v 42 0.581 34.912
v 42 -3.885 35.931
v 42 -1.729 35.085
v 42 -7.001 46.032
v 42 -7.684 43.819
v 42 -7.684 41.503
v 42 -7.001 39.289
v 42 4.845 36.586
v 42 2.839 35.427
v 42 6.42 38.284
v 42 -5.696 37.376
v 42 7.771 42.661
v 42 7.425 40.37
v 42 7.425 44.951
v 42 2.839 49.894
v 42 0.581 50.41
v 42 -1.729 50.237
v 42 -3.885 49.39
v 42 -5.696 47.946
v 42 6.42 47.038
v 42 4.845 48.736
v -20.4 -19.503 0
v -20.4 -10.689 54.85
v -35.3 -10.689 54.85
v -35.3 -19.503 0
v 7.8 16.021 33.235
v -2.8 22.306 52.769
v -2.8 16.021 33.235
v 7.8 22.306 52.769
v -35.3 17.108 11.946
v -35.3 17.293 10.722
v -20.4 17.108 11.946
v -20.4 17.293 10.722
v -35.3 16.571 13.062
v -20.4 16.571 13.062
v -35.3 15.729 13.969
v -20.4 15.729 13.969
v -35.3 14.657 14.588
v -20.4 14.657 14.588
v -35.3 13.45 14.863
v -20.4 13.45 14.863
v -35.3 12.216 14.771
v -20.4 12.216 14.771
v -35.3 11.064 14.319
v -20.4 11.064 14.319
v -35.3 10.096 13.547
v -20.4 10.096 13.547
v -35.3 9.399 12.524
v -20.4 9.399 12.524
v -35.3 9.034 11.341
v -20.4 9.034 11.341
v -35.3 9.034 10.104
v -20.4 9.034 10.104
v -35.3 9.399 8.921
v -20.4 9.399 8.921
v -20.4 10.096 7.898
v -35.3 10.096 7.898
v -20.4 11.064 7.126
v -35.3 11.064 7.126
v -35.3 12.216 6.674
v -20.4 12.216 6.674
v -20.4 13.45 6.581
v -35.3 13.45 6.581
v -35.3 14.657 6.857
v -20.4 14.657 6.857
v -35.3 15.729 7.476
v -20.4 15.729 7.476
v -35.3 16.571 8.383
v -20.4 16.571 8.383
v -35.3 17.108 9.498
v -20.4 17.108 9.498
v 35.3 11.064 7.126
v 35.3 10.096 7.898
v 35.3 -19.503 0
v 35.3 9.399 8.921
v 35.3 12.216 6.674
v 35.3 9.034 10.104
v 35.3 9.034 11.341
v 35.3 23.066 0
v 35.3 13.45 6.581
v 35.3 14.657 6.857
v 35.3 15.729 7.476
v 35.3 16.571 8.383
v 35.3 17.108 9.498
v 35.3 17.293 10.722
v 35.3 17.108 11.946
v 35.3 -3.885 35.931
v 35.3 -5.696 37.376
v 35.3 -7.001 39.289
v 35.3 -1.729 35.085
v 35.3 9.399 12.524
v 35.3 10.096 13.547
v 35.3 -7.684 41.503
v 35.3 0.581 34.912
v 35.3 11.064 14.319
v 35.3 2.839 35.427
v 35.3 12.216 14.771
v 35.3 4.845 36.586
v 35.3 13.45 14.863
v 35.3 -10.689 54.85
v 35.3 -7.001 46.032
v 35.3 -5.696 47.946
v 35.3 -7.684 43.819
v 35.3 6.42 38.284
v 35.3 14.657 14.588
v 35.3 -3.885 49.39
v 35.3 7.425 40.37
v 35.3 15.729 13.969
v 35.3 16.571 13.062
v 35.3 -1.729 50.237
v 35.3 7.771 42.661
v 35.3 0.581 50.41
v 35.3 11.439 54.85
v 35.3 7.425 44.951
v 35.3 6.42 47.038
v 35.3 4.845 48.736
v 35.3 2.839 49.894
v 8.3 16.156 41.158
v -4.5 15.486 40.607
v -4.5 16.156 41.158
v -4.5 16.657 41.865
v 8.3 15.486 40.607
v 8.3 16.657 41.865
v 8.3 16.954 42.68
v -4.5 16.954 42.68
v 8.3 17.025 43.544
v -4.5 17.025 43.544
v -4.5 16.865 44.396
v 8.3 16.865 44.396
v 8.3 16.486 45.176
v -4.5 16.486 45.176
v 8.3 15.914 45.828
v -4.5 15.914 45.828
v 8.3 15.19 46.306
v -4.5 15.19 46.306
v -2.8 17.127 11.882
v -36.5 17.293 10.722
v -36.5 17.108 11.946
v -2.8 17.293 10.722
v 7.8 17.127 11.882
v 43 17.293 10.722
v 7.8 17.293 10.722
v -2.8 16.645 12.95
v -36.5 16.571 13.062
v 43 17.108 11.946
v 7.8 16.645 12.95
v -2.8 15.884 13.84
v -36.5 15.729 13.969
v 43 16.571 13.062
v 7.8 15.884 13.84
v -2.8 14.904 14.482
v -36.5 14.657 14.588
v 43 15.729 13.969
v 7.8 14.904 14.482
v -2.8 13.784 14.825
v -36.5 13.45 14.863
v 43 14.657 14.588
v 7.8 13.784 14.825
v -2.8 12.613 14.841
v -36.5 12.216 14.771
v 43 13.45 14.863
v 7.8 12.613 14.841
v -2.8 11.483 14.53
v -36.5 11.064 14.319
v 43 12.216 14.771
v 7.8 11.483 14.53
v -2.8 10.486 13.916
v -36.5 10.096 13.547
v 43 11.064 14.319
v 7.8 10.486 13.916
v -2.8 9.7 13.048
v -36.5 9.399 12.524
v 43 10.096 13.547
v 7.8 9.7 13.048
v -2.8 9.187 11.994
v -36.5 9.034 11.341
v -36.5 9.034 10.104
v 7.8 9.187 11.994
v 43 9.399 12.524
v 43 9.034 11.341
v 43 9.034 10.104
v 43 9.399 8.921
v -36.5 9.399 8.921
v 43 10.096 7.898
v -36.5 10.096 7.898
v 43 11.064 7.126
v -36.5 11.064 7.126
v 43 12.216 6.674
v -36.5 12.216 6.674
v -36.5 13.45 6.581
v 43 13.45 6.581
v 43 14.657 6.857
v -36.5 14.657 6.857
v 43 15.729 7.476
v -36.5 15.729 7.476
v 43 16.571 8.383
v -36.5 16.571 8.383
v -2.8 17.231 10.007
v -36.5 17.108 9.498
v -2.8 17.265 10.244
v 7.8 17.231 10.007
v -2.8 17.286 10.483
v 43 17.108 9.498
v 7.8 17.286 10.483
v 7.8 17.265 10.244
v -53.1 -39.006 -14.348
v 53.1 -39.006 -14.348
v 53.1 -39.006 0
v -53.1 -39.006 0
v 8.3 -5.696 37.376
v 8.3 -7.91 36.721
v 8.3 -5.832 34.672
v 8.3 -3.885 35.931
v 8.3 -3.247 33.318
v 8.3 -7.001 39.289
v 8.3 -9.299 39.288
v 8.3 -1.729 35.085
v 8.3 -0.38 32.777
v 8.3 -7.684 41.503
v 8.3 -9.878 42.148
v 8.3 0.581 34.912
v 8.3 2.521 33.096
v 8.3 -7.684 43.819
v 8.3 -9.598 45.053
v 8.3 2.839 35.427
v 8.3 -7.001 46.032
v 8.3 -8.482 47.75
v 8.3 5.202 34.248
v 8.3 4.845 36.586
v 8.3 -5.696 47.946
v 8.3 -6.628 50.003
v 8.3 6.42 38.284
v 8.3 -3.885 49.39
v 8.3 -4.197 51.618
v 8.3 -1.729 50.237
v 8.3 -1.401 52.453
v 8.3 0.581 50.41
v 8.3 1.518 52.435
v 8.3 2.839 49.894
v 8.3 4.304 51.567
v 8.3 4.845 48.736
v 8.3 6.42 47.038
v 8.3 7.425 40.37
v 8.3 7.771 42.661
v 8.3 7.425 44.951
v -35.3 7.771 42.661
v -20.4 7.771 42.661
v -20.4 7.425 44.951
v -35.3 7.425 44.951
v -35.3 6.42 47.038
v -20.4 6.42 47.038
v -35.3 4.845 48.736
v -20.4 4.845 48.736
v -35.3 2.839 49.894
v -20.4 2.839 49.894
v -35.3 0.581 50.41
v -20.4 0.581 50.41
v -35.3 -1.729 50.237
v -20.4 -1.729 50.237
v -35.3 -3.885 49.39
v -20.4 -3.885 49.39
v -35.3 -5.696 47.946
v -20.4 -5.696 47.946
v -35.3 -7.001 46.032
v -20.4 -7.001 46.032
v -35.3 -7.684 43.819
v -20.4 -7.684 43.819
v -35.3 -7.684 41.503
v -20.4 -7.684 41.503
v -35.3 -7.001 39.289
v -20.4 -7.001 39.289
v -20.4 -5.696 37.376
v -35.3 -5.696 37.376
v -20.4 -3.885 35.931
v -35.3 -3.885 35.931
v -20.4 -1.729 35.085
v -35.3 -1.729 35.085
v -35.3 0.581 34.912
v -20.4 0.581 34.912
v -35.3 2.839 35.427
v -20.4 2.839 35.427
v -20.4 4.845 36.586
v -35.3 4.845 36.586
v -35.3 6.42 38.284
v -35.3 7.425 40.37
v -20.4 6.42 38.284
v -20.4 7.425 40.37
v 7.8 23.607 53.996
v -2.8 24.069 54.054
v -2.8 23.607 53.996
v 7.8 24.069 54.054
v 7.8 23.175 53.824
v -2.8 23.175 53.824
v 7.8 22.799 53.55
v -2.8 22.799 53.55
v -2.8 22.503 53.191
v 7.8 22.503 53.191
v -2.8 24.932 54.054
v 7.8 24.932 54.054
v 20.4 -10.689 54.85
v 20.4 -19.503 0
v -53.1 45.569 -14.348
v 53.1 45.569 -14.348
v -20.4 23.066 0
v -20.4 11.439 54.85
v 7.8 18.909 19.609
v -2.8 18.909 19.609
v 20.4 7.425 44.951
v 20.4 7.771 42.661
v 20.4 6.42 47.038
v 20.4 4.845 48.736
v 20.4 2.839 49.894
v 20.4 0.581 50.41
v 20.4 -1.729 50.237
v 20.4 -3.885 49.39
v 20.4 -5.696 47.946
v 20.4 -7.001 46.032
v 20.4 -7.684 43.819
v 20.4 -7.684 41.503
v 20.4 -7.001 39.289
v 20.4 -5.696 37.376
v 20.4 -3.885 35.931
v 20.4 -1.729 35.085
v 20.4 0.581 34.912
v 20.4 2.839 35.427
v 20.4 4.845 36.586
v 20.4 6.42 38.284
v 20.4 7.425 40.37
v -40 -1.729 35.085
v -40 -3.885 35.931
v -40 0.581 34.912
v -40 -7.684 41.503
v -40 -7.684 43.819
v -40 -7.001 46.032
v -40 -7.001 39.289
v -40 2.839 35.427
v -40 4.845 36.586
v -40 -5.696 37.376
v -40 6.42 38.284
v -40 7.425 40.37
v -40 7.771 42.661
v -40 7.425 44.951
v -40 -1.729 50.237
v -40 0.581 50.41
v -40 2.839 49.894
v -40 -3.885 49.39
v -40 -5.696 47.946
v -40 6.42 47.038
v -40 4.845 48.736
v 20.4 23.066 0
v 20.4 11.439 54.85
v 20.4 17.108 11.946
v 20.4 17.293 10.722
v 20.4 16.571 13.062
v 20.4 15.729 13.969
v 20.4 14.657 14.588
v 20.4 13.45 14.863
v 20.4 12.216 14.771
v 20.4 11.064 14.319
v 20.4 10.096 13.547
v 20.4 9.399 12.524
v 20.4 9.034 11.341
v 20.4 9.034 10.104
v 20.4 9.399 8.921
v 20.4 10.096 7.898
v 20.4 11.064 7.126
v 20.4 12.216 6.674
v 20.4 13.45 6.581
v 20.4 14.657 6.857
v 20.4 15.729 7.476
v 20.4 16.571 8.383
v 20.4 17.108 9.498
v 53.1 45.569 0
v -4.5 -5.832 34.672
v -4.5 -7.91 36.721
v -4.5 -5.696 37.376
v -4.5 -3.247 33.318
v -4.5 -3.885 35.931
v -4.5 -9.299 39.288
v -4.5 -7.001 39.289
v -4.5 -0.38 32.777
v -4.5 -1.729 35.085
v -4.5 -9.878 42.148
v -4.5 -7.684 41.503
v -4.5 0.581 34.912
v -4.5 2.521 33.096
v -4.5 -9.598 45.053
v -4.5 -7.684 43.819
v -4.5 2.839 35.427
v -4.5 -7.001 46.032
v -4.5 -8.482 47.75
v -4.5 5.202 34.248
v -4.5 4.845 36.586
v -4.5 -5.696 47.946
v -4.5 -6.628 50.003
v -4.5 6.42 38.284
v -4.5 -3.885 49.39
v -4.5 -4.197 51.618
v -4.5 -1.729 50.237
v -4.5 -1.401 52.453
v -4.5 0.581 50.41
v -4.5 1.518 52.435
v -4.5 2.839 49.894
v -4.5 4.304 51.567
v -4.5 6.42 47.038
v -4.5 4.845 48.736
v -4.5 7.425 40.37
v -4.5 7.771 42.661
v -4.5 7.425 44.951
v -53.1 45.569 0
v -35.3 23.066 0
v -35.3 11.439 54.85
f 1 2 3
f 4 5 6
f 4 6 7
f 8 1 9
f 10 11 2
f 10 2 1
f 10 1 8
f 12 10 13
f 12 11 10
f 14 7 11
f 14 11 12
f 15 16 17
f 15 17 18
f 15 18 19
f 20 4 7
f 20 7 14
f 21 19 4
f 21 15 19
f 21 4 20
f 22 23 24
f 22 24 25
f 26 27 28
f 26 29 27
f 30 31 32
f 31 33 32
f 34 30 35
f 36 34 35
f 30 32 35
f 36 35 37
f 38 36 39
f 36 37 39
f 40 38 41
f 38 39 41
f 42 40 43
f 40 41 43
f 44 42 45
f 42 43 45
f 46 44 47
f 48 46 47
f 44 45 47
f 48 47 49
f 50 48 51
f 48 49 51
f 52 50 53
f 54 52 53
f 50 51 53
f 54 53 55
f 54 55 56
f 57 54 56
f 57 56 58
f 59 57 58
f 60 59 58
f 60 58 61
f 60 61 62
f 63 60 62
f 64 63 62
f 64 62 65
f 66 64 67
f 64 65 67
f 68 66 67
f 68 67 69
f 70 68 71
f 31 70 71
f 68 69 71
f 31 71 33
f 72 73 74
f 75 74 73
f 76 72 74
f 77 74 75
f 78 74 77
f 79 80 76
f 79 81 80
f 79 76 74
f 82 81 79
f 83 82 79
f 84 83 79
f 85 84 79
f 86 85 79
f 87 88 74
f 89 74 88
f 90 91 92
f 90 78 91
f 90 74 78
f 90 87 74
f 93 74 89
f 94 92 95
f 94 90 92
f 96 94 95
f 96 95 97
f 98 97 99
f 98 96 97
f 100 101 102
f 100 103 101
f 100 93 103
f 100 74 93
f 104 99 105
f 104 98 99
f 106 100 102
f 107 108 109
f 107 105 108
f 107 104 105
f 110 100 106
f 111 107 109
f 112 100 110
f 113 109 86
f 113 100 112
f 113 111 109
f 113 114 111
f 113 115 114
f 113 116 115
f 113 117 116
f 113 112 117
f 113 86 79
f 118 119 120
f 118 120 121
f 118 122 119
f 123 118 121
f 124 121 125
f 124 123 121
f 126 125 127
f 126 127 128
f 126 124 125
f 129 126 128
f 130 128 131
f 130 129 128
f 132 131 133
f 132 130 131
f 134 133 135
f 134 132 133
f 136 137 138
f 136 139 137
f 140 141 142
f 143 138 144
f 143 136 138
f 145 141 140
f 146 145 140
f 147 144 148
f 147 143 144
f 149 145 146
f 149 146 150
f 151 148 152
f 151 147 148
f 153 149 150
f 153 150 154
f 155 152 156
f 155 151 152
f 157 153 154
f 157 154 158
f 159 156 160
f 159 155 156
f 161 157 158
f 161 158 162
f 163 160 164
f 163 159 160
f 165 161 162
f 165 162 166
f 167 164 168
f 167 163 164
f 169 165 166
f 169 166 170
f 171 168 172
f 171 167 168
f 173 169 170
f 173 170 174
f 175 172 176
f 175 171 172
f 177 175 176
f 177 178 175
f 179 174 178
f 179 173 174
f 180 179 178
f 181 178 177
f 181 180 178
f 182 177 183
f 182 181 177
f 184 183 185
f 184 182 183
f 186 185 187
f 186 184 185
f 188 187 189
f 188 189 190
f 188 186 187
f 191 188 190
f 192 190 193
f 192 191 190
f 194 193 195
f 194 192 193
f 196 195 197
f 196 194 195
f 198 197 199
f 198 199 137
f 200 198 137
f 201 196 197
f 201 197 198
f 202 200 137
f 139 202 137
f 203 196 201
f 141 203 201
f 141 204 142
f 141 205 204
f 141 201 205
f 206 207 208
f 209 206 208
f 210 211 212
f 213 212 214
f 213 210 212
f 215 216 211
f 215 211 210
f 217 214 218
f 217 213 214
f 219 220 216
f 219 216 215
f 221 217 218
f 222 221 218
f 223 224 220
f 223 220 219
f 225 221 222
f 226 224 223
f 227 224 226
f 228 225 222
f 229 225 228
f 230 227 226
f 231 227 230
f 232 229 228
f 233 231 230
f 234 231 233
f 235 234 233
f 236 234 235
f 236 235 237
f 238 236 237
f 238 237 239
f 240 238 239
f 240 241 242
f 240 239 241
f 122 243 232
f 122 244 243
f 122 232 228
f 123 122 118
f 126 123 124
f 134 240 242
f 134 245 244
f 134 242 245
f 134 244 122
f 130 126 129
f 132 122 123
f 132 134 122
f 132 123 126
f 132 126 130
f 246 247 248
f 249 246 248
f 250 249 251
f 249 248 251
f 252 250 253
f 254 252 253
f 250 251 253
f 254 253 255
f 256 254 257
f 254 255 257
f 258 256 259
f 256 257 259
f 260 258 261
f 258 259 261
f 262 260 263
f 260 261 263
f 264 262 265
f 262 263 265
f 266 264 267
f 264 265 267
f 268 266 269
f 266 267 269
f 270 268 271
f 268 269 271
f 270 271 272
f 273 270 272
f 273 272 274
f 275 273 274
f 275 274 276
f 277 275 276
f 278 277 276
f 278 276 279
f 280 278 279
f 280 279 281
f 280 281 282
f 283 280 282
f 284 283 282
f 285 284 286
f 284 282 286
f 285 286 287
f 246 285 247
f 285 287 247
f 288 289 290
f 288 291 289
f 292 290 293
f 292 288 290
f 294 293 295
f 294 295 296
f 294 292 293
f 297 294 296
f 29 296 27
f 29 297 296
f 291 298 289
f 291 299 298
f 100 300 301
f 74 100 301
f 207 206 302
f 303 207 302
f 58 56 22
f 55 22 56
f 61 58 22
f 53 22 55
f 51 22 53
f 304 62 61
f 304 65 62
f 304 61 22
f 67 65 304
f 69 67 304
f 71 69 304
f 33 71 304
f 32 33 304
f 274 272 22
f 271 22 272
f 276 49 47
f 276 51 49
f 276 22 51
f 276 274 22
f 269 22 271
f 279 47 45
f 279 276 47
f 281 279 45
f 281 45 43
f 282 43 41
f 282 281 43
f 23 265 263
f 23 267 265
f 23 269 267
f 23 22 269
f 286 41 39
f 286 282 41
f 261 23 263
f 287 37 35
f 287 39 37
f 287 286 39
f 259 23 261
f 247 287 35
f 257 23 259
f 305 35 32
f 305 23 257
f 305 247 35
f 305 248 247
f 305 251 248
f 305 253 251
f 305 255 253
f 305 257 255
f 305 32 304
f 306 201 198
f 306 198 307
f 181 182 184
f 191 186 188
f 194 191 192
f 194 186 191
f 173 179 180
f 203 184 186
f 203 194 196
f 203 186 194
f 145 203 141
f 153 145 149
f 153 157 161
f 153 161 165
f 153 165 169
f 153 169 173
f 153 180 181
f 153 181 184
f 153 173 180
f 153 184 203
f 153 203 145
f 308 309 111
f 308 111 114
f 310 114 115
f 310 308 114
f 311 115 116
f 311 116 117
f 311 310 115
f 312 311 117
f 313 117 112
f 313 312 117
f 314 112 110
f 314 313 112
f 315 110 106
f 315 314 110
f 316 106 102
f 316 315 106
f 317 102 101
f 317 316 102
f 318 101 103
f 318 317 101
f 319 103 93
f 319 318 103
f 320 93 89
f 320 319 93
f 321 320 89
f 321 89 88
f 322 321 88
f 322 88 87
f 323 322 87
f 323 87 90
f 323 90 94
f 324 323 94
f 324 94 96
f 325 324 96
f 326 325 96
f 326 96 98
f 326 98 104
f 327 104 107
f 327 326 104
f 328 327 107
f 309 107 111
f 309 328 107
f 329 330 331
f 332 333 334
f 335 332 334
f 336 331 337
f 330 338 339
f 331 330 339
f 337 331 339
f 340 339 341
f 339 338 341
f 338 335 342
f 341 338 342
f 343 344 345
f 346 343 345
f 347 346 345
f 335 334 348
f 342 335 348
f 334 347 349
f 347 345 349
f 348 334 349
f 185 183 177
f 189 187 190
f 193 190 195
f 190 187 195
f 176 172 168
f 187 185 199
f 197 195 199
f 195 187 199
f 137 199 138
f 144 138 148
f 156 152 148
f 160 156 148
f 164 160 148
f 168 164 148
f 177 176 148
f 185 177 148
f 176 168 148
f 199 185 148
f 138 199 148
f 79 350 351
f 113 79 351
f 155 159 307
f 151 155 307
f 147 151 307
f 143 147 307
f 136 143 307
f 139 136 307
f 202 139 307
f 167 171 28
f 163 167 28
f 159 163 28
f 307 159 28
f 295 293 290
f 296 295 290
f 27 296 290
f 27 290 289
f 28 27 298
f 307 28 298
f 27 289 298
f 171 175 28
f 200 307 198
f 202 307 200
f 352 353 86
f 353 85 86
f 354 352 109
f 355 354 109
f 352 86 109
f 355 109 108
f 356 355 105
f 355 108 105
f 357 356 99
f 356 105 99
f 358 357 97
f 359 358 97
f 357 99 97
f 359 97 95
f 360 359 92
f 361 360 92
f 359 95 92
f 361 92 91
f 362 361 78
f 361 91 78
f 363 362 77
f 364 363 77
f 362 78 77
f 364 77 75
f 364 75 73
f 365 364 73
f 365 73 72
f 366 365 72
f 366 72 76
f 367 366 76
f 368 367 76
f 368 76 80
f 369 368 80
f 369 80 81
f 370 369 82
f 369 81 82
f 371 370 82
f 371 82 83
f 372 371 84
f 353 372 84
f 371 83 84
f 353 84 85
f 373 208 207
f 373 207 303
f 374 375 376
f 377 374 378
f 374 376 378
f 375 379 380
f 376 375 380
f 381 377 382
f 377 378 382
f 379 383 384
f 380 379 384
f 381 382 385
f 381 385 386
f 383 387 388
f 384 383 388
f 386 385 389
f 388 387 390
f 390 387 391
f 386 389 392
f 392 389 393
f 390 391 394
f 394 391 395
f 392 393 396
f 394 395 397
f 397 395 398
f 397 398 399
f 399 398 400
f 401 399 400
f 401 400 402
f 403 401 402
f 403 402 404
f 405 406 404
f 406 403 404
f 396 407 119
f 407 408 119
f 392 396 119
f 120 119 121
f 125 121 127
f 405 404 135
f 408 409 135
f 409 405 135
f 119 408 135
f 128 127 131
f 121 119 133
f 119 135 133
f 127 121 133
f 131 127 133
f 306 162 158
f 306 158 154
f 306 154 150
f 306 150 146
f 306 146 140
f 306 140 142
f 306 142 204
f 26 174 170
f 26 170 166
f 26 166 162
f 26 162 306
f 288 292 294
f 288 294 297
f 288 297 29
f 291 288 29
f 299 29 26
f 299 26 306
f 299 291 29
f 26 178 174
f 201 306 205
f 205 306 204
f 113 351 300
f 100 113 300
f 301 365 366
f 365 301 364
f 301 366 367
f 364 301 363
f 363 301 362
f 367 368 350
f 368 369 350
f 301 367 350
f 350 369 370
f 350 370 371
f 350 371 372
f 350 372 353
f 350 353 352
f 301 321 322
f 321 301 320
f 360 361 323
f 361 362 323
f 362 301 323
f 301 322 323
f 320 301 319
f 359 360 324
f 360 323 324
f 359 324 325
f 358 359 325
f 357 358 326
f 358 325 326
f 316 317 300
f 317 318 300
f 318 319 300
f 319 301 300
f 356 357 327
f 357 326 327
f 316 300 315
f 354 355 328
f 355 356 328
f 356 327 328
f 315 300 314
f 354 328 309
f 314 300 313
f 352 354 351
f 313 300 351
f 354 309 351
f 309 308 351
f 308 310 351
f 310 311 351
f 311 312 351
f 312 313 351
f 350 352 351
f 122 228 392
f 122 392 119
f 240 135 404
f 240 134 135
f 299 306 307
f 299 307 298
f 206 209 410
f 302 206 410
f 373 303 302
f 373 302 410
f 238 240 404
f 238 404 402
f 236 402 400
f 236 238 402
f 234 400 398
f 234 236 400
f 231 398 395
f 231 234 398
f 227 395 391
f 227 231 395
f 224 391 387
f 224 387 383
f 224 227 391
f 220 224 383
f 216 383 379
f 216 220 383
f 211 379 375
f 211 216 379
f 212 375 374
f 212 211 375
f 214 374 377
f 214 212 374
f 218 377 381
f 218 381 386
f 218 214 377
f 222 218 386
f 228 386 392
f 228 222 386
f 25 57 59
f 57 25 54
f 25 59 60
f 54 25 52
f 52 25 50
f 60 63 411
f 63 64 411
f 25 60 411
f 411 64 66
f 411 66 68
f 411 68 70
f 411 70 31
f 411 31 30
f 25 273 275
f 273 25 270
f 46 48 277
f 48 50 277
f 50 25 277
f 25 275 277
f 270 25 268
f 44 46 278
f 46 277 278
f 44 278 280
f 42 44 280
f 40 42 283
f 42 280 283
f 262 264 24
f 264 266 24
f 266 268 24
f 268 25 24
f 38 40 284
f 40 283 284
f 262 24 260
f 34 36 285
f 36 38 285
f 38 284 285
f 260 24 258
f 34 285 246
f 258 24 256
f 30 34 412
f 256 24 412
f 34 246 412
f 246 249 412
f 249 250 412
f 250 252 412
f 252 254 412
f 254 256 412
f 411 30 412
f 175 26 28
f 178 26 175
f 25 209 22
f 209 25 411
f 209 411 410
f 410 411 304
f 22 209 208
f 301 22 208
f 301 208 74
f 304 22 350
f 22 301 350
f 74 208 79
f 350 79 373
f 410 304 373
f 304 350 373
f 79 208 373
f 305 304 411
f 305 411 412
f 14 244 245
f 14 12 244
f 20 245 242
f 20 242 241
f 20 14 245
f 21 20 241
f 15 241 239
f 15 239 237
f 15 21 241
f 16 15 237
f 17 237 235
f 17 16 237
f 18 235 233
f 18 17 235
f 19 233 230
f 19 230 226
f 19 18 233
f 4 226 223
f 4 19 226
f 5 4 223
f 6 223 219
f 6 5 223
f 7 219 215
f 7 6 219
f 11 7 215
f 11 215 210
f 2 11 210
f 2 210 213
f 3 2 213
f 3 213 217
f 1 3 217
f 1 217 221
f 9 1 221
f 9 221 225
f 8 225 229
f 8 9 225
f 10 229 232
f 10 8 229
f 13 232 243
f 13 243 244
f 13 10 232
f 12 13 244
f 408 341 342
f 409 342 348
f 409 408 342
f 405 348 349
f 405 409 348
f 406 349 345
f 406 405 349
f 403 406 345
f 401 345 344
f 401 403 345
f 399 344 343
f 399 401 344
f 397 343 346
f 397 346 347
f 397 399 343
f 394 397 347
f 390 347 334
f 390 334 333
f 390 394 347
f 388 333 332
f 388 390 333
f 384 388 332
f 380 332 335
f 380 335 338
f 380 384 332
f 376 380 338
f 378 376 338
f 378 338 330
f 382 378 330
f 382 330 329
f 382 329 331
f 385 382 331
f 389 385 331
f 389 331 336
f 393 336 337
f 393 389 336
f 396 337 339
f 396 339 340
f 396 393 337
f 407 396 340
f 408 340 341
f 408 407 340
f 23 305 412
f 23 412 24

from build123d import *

# Parameters (mm, degrees)
F0_W           = 84.5754630864
F0_H           = 14.3479024991
F1_DEPTH       = 53.1
F3_START       = 20.4
F2_R           = 7.7705756534
F3_DEPTH       = 14.9
F5_DEPTH       = 42
F5_DEPTH_BACK  = 40
F6_R           = 7.7705756534
F7_DEPTH       = 8.3
F7_DEPTH_BACK  = 4.5
F8_R           = 4.1525675238
F9_DEPTH       = 43
F9_DEPTH_BACK  = 36.5
F12_DEPTH      = 7.8
F12_DEPTH_BACK = 2.8


with BuildPart() as f1:
    # F0 (on Right) → F1 (new body, symmetric)
    with BuildSketch(Plane.YZ):
        with Locations((3.2817516476, -7.1739512496)):
            Rectangle(F0_W, F0_H)
    extrude(amount=F1_DEPTH, both=True)

    # F2 (on Right) → F3 (join)
    with BuildSketch(Plane.YZ.offset(F3_START)):
        Polygon((-10.6891365722, 54.8502057791), (-19.5029862225, 0), (23.0660419911, 0), (11.4392554387, 54.8502057791), align=None)
        with Locations((0, 42.6608361304)):
            Circle(F2_R, mode=Mode.SUBTRACT)
    extrude(amount=F3_DEPTH)

    # F4: F1 across plane


with BuildPart() as f1_1:
    add(f1.part)
    add(f1.part.mirror(Plane.YZ))


with BuildPart() as f5:
    # F2 (on Right) → F5 (new body, two sides)
    with BuildSketch(Plane.YZ) as f5_sk:
        with Locations((0, 42.6608361304)):
            Circle(F2_R)
    extrude(amount=F5_DEPTH)
    extrude(f5_sk.sketch, amount=-F5_DEPTH_BACK)

    # F6 (on Right) → F7 (join, two sides)
    with BuildSketch(Plane.YZ) as f7_sk:
        with BuildLine():
            Line((15.1903728216, 46.3061307258), (4.3038249038, 51.5669740377))
            ThreePointArc((4.3038249038, 51.5669740377), (-9.8782327658, 42.1482752543), (5.202472379, 34.2479601434))
            Line((5.202472379, 34.2479601434), (15.4860743749, 40.6072783388))
            ThreePointArc((15.4860743749, 40.6072783388), (17.0246416631, 43.5442092451), (15.1903728216, 46.3061307258))
        make_face()
        with Locations((0, 42.6608361304)):
            Circle(F6_R, mode=Mode.SUBTRACT)
    extrude(amount=F7_DEPTH)
    extrude(f7_sk.sketch, amount=-F7_DEPTH_BACK)


with BuildPart() as f9:
    # F8 (on face) → F9 (new body, two sides)
    with BuildSketch(Plane.YZ) as f9_sk:
        with Locations((13.1401270628, 10.7224332169)):
            Circle(F8_R)
    extrude(amount=F9_DEPTH)
    extrude(f9_sk.sketch, amount=-F9_DEPTH_BACK)


with BuildPart() as f1_2:
    add(f1_1.part)

    # F10: cut F9
    add(f9.part, mode=Mode.SUBTRACT)


with BuildPart() as f9_1:
    add(f9.part)

    # F11 (on face) → F12 (join, two sides)
    with BuildSketch(Plane.YZ) as f12_sk:
        with BuildLine():
            Line((22.3057325511, 52.7694041005), (16.0210298515, 33.2353538817))
            Line((16.0210298515, 33.2353538817), (18.9094234847, 19.6091481849))
            Line((18.9094234847, 19.6091481849), (24.9317679843, 54.0543771534))
            Line((24.9317679843, 54.0543771534), (24.0689877174, 54.0543771534))
            ThreePointArc((24.0689877174, 54.0543771534), (22.9780907782, 53.6990525036), (22.3057325511, 52.7694041005))
        make_face()
        with BuildLine():
            ThreePointArc((9.1871122098, 11.9942392601), (13.7838101914, 14.8248092442), (17.2926945866, 10.7224332169))
            ThreePointArc((17.2926945866, 10.7224332169), (17.2771530738, 10.3635003213), (17.2306448678, 10.0072541299))
            Line((17.2306448678, 10.0072541299), (18.9094234847, 19.6091481849))
            Line((18.9094234847, 19.6091481849), (16.0210298515, 33.2353538817))
            Line((16.0210298515, 33.2353538817), (9.1871122098, 11.9942392601))
        make_face()
    extrude(amount=F12_DEPTH)
    extrude(f12_sk.sketch, amount=-F12_DEPTH_BACK)


solid = Compound([f5.part, f1_2.part, f9_1.part])
